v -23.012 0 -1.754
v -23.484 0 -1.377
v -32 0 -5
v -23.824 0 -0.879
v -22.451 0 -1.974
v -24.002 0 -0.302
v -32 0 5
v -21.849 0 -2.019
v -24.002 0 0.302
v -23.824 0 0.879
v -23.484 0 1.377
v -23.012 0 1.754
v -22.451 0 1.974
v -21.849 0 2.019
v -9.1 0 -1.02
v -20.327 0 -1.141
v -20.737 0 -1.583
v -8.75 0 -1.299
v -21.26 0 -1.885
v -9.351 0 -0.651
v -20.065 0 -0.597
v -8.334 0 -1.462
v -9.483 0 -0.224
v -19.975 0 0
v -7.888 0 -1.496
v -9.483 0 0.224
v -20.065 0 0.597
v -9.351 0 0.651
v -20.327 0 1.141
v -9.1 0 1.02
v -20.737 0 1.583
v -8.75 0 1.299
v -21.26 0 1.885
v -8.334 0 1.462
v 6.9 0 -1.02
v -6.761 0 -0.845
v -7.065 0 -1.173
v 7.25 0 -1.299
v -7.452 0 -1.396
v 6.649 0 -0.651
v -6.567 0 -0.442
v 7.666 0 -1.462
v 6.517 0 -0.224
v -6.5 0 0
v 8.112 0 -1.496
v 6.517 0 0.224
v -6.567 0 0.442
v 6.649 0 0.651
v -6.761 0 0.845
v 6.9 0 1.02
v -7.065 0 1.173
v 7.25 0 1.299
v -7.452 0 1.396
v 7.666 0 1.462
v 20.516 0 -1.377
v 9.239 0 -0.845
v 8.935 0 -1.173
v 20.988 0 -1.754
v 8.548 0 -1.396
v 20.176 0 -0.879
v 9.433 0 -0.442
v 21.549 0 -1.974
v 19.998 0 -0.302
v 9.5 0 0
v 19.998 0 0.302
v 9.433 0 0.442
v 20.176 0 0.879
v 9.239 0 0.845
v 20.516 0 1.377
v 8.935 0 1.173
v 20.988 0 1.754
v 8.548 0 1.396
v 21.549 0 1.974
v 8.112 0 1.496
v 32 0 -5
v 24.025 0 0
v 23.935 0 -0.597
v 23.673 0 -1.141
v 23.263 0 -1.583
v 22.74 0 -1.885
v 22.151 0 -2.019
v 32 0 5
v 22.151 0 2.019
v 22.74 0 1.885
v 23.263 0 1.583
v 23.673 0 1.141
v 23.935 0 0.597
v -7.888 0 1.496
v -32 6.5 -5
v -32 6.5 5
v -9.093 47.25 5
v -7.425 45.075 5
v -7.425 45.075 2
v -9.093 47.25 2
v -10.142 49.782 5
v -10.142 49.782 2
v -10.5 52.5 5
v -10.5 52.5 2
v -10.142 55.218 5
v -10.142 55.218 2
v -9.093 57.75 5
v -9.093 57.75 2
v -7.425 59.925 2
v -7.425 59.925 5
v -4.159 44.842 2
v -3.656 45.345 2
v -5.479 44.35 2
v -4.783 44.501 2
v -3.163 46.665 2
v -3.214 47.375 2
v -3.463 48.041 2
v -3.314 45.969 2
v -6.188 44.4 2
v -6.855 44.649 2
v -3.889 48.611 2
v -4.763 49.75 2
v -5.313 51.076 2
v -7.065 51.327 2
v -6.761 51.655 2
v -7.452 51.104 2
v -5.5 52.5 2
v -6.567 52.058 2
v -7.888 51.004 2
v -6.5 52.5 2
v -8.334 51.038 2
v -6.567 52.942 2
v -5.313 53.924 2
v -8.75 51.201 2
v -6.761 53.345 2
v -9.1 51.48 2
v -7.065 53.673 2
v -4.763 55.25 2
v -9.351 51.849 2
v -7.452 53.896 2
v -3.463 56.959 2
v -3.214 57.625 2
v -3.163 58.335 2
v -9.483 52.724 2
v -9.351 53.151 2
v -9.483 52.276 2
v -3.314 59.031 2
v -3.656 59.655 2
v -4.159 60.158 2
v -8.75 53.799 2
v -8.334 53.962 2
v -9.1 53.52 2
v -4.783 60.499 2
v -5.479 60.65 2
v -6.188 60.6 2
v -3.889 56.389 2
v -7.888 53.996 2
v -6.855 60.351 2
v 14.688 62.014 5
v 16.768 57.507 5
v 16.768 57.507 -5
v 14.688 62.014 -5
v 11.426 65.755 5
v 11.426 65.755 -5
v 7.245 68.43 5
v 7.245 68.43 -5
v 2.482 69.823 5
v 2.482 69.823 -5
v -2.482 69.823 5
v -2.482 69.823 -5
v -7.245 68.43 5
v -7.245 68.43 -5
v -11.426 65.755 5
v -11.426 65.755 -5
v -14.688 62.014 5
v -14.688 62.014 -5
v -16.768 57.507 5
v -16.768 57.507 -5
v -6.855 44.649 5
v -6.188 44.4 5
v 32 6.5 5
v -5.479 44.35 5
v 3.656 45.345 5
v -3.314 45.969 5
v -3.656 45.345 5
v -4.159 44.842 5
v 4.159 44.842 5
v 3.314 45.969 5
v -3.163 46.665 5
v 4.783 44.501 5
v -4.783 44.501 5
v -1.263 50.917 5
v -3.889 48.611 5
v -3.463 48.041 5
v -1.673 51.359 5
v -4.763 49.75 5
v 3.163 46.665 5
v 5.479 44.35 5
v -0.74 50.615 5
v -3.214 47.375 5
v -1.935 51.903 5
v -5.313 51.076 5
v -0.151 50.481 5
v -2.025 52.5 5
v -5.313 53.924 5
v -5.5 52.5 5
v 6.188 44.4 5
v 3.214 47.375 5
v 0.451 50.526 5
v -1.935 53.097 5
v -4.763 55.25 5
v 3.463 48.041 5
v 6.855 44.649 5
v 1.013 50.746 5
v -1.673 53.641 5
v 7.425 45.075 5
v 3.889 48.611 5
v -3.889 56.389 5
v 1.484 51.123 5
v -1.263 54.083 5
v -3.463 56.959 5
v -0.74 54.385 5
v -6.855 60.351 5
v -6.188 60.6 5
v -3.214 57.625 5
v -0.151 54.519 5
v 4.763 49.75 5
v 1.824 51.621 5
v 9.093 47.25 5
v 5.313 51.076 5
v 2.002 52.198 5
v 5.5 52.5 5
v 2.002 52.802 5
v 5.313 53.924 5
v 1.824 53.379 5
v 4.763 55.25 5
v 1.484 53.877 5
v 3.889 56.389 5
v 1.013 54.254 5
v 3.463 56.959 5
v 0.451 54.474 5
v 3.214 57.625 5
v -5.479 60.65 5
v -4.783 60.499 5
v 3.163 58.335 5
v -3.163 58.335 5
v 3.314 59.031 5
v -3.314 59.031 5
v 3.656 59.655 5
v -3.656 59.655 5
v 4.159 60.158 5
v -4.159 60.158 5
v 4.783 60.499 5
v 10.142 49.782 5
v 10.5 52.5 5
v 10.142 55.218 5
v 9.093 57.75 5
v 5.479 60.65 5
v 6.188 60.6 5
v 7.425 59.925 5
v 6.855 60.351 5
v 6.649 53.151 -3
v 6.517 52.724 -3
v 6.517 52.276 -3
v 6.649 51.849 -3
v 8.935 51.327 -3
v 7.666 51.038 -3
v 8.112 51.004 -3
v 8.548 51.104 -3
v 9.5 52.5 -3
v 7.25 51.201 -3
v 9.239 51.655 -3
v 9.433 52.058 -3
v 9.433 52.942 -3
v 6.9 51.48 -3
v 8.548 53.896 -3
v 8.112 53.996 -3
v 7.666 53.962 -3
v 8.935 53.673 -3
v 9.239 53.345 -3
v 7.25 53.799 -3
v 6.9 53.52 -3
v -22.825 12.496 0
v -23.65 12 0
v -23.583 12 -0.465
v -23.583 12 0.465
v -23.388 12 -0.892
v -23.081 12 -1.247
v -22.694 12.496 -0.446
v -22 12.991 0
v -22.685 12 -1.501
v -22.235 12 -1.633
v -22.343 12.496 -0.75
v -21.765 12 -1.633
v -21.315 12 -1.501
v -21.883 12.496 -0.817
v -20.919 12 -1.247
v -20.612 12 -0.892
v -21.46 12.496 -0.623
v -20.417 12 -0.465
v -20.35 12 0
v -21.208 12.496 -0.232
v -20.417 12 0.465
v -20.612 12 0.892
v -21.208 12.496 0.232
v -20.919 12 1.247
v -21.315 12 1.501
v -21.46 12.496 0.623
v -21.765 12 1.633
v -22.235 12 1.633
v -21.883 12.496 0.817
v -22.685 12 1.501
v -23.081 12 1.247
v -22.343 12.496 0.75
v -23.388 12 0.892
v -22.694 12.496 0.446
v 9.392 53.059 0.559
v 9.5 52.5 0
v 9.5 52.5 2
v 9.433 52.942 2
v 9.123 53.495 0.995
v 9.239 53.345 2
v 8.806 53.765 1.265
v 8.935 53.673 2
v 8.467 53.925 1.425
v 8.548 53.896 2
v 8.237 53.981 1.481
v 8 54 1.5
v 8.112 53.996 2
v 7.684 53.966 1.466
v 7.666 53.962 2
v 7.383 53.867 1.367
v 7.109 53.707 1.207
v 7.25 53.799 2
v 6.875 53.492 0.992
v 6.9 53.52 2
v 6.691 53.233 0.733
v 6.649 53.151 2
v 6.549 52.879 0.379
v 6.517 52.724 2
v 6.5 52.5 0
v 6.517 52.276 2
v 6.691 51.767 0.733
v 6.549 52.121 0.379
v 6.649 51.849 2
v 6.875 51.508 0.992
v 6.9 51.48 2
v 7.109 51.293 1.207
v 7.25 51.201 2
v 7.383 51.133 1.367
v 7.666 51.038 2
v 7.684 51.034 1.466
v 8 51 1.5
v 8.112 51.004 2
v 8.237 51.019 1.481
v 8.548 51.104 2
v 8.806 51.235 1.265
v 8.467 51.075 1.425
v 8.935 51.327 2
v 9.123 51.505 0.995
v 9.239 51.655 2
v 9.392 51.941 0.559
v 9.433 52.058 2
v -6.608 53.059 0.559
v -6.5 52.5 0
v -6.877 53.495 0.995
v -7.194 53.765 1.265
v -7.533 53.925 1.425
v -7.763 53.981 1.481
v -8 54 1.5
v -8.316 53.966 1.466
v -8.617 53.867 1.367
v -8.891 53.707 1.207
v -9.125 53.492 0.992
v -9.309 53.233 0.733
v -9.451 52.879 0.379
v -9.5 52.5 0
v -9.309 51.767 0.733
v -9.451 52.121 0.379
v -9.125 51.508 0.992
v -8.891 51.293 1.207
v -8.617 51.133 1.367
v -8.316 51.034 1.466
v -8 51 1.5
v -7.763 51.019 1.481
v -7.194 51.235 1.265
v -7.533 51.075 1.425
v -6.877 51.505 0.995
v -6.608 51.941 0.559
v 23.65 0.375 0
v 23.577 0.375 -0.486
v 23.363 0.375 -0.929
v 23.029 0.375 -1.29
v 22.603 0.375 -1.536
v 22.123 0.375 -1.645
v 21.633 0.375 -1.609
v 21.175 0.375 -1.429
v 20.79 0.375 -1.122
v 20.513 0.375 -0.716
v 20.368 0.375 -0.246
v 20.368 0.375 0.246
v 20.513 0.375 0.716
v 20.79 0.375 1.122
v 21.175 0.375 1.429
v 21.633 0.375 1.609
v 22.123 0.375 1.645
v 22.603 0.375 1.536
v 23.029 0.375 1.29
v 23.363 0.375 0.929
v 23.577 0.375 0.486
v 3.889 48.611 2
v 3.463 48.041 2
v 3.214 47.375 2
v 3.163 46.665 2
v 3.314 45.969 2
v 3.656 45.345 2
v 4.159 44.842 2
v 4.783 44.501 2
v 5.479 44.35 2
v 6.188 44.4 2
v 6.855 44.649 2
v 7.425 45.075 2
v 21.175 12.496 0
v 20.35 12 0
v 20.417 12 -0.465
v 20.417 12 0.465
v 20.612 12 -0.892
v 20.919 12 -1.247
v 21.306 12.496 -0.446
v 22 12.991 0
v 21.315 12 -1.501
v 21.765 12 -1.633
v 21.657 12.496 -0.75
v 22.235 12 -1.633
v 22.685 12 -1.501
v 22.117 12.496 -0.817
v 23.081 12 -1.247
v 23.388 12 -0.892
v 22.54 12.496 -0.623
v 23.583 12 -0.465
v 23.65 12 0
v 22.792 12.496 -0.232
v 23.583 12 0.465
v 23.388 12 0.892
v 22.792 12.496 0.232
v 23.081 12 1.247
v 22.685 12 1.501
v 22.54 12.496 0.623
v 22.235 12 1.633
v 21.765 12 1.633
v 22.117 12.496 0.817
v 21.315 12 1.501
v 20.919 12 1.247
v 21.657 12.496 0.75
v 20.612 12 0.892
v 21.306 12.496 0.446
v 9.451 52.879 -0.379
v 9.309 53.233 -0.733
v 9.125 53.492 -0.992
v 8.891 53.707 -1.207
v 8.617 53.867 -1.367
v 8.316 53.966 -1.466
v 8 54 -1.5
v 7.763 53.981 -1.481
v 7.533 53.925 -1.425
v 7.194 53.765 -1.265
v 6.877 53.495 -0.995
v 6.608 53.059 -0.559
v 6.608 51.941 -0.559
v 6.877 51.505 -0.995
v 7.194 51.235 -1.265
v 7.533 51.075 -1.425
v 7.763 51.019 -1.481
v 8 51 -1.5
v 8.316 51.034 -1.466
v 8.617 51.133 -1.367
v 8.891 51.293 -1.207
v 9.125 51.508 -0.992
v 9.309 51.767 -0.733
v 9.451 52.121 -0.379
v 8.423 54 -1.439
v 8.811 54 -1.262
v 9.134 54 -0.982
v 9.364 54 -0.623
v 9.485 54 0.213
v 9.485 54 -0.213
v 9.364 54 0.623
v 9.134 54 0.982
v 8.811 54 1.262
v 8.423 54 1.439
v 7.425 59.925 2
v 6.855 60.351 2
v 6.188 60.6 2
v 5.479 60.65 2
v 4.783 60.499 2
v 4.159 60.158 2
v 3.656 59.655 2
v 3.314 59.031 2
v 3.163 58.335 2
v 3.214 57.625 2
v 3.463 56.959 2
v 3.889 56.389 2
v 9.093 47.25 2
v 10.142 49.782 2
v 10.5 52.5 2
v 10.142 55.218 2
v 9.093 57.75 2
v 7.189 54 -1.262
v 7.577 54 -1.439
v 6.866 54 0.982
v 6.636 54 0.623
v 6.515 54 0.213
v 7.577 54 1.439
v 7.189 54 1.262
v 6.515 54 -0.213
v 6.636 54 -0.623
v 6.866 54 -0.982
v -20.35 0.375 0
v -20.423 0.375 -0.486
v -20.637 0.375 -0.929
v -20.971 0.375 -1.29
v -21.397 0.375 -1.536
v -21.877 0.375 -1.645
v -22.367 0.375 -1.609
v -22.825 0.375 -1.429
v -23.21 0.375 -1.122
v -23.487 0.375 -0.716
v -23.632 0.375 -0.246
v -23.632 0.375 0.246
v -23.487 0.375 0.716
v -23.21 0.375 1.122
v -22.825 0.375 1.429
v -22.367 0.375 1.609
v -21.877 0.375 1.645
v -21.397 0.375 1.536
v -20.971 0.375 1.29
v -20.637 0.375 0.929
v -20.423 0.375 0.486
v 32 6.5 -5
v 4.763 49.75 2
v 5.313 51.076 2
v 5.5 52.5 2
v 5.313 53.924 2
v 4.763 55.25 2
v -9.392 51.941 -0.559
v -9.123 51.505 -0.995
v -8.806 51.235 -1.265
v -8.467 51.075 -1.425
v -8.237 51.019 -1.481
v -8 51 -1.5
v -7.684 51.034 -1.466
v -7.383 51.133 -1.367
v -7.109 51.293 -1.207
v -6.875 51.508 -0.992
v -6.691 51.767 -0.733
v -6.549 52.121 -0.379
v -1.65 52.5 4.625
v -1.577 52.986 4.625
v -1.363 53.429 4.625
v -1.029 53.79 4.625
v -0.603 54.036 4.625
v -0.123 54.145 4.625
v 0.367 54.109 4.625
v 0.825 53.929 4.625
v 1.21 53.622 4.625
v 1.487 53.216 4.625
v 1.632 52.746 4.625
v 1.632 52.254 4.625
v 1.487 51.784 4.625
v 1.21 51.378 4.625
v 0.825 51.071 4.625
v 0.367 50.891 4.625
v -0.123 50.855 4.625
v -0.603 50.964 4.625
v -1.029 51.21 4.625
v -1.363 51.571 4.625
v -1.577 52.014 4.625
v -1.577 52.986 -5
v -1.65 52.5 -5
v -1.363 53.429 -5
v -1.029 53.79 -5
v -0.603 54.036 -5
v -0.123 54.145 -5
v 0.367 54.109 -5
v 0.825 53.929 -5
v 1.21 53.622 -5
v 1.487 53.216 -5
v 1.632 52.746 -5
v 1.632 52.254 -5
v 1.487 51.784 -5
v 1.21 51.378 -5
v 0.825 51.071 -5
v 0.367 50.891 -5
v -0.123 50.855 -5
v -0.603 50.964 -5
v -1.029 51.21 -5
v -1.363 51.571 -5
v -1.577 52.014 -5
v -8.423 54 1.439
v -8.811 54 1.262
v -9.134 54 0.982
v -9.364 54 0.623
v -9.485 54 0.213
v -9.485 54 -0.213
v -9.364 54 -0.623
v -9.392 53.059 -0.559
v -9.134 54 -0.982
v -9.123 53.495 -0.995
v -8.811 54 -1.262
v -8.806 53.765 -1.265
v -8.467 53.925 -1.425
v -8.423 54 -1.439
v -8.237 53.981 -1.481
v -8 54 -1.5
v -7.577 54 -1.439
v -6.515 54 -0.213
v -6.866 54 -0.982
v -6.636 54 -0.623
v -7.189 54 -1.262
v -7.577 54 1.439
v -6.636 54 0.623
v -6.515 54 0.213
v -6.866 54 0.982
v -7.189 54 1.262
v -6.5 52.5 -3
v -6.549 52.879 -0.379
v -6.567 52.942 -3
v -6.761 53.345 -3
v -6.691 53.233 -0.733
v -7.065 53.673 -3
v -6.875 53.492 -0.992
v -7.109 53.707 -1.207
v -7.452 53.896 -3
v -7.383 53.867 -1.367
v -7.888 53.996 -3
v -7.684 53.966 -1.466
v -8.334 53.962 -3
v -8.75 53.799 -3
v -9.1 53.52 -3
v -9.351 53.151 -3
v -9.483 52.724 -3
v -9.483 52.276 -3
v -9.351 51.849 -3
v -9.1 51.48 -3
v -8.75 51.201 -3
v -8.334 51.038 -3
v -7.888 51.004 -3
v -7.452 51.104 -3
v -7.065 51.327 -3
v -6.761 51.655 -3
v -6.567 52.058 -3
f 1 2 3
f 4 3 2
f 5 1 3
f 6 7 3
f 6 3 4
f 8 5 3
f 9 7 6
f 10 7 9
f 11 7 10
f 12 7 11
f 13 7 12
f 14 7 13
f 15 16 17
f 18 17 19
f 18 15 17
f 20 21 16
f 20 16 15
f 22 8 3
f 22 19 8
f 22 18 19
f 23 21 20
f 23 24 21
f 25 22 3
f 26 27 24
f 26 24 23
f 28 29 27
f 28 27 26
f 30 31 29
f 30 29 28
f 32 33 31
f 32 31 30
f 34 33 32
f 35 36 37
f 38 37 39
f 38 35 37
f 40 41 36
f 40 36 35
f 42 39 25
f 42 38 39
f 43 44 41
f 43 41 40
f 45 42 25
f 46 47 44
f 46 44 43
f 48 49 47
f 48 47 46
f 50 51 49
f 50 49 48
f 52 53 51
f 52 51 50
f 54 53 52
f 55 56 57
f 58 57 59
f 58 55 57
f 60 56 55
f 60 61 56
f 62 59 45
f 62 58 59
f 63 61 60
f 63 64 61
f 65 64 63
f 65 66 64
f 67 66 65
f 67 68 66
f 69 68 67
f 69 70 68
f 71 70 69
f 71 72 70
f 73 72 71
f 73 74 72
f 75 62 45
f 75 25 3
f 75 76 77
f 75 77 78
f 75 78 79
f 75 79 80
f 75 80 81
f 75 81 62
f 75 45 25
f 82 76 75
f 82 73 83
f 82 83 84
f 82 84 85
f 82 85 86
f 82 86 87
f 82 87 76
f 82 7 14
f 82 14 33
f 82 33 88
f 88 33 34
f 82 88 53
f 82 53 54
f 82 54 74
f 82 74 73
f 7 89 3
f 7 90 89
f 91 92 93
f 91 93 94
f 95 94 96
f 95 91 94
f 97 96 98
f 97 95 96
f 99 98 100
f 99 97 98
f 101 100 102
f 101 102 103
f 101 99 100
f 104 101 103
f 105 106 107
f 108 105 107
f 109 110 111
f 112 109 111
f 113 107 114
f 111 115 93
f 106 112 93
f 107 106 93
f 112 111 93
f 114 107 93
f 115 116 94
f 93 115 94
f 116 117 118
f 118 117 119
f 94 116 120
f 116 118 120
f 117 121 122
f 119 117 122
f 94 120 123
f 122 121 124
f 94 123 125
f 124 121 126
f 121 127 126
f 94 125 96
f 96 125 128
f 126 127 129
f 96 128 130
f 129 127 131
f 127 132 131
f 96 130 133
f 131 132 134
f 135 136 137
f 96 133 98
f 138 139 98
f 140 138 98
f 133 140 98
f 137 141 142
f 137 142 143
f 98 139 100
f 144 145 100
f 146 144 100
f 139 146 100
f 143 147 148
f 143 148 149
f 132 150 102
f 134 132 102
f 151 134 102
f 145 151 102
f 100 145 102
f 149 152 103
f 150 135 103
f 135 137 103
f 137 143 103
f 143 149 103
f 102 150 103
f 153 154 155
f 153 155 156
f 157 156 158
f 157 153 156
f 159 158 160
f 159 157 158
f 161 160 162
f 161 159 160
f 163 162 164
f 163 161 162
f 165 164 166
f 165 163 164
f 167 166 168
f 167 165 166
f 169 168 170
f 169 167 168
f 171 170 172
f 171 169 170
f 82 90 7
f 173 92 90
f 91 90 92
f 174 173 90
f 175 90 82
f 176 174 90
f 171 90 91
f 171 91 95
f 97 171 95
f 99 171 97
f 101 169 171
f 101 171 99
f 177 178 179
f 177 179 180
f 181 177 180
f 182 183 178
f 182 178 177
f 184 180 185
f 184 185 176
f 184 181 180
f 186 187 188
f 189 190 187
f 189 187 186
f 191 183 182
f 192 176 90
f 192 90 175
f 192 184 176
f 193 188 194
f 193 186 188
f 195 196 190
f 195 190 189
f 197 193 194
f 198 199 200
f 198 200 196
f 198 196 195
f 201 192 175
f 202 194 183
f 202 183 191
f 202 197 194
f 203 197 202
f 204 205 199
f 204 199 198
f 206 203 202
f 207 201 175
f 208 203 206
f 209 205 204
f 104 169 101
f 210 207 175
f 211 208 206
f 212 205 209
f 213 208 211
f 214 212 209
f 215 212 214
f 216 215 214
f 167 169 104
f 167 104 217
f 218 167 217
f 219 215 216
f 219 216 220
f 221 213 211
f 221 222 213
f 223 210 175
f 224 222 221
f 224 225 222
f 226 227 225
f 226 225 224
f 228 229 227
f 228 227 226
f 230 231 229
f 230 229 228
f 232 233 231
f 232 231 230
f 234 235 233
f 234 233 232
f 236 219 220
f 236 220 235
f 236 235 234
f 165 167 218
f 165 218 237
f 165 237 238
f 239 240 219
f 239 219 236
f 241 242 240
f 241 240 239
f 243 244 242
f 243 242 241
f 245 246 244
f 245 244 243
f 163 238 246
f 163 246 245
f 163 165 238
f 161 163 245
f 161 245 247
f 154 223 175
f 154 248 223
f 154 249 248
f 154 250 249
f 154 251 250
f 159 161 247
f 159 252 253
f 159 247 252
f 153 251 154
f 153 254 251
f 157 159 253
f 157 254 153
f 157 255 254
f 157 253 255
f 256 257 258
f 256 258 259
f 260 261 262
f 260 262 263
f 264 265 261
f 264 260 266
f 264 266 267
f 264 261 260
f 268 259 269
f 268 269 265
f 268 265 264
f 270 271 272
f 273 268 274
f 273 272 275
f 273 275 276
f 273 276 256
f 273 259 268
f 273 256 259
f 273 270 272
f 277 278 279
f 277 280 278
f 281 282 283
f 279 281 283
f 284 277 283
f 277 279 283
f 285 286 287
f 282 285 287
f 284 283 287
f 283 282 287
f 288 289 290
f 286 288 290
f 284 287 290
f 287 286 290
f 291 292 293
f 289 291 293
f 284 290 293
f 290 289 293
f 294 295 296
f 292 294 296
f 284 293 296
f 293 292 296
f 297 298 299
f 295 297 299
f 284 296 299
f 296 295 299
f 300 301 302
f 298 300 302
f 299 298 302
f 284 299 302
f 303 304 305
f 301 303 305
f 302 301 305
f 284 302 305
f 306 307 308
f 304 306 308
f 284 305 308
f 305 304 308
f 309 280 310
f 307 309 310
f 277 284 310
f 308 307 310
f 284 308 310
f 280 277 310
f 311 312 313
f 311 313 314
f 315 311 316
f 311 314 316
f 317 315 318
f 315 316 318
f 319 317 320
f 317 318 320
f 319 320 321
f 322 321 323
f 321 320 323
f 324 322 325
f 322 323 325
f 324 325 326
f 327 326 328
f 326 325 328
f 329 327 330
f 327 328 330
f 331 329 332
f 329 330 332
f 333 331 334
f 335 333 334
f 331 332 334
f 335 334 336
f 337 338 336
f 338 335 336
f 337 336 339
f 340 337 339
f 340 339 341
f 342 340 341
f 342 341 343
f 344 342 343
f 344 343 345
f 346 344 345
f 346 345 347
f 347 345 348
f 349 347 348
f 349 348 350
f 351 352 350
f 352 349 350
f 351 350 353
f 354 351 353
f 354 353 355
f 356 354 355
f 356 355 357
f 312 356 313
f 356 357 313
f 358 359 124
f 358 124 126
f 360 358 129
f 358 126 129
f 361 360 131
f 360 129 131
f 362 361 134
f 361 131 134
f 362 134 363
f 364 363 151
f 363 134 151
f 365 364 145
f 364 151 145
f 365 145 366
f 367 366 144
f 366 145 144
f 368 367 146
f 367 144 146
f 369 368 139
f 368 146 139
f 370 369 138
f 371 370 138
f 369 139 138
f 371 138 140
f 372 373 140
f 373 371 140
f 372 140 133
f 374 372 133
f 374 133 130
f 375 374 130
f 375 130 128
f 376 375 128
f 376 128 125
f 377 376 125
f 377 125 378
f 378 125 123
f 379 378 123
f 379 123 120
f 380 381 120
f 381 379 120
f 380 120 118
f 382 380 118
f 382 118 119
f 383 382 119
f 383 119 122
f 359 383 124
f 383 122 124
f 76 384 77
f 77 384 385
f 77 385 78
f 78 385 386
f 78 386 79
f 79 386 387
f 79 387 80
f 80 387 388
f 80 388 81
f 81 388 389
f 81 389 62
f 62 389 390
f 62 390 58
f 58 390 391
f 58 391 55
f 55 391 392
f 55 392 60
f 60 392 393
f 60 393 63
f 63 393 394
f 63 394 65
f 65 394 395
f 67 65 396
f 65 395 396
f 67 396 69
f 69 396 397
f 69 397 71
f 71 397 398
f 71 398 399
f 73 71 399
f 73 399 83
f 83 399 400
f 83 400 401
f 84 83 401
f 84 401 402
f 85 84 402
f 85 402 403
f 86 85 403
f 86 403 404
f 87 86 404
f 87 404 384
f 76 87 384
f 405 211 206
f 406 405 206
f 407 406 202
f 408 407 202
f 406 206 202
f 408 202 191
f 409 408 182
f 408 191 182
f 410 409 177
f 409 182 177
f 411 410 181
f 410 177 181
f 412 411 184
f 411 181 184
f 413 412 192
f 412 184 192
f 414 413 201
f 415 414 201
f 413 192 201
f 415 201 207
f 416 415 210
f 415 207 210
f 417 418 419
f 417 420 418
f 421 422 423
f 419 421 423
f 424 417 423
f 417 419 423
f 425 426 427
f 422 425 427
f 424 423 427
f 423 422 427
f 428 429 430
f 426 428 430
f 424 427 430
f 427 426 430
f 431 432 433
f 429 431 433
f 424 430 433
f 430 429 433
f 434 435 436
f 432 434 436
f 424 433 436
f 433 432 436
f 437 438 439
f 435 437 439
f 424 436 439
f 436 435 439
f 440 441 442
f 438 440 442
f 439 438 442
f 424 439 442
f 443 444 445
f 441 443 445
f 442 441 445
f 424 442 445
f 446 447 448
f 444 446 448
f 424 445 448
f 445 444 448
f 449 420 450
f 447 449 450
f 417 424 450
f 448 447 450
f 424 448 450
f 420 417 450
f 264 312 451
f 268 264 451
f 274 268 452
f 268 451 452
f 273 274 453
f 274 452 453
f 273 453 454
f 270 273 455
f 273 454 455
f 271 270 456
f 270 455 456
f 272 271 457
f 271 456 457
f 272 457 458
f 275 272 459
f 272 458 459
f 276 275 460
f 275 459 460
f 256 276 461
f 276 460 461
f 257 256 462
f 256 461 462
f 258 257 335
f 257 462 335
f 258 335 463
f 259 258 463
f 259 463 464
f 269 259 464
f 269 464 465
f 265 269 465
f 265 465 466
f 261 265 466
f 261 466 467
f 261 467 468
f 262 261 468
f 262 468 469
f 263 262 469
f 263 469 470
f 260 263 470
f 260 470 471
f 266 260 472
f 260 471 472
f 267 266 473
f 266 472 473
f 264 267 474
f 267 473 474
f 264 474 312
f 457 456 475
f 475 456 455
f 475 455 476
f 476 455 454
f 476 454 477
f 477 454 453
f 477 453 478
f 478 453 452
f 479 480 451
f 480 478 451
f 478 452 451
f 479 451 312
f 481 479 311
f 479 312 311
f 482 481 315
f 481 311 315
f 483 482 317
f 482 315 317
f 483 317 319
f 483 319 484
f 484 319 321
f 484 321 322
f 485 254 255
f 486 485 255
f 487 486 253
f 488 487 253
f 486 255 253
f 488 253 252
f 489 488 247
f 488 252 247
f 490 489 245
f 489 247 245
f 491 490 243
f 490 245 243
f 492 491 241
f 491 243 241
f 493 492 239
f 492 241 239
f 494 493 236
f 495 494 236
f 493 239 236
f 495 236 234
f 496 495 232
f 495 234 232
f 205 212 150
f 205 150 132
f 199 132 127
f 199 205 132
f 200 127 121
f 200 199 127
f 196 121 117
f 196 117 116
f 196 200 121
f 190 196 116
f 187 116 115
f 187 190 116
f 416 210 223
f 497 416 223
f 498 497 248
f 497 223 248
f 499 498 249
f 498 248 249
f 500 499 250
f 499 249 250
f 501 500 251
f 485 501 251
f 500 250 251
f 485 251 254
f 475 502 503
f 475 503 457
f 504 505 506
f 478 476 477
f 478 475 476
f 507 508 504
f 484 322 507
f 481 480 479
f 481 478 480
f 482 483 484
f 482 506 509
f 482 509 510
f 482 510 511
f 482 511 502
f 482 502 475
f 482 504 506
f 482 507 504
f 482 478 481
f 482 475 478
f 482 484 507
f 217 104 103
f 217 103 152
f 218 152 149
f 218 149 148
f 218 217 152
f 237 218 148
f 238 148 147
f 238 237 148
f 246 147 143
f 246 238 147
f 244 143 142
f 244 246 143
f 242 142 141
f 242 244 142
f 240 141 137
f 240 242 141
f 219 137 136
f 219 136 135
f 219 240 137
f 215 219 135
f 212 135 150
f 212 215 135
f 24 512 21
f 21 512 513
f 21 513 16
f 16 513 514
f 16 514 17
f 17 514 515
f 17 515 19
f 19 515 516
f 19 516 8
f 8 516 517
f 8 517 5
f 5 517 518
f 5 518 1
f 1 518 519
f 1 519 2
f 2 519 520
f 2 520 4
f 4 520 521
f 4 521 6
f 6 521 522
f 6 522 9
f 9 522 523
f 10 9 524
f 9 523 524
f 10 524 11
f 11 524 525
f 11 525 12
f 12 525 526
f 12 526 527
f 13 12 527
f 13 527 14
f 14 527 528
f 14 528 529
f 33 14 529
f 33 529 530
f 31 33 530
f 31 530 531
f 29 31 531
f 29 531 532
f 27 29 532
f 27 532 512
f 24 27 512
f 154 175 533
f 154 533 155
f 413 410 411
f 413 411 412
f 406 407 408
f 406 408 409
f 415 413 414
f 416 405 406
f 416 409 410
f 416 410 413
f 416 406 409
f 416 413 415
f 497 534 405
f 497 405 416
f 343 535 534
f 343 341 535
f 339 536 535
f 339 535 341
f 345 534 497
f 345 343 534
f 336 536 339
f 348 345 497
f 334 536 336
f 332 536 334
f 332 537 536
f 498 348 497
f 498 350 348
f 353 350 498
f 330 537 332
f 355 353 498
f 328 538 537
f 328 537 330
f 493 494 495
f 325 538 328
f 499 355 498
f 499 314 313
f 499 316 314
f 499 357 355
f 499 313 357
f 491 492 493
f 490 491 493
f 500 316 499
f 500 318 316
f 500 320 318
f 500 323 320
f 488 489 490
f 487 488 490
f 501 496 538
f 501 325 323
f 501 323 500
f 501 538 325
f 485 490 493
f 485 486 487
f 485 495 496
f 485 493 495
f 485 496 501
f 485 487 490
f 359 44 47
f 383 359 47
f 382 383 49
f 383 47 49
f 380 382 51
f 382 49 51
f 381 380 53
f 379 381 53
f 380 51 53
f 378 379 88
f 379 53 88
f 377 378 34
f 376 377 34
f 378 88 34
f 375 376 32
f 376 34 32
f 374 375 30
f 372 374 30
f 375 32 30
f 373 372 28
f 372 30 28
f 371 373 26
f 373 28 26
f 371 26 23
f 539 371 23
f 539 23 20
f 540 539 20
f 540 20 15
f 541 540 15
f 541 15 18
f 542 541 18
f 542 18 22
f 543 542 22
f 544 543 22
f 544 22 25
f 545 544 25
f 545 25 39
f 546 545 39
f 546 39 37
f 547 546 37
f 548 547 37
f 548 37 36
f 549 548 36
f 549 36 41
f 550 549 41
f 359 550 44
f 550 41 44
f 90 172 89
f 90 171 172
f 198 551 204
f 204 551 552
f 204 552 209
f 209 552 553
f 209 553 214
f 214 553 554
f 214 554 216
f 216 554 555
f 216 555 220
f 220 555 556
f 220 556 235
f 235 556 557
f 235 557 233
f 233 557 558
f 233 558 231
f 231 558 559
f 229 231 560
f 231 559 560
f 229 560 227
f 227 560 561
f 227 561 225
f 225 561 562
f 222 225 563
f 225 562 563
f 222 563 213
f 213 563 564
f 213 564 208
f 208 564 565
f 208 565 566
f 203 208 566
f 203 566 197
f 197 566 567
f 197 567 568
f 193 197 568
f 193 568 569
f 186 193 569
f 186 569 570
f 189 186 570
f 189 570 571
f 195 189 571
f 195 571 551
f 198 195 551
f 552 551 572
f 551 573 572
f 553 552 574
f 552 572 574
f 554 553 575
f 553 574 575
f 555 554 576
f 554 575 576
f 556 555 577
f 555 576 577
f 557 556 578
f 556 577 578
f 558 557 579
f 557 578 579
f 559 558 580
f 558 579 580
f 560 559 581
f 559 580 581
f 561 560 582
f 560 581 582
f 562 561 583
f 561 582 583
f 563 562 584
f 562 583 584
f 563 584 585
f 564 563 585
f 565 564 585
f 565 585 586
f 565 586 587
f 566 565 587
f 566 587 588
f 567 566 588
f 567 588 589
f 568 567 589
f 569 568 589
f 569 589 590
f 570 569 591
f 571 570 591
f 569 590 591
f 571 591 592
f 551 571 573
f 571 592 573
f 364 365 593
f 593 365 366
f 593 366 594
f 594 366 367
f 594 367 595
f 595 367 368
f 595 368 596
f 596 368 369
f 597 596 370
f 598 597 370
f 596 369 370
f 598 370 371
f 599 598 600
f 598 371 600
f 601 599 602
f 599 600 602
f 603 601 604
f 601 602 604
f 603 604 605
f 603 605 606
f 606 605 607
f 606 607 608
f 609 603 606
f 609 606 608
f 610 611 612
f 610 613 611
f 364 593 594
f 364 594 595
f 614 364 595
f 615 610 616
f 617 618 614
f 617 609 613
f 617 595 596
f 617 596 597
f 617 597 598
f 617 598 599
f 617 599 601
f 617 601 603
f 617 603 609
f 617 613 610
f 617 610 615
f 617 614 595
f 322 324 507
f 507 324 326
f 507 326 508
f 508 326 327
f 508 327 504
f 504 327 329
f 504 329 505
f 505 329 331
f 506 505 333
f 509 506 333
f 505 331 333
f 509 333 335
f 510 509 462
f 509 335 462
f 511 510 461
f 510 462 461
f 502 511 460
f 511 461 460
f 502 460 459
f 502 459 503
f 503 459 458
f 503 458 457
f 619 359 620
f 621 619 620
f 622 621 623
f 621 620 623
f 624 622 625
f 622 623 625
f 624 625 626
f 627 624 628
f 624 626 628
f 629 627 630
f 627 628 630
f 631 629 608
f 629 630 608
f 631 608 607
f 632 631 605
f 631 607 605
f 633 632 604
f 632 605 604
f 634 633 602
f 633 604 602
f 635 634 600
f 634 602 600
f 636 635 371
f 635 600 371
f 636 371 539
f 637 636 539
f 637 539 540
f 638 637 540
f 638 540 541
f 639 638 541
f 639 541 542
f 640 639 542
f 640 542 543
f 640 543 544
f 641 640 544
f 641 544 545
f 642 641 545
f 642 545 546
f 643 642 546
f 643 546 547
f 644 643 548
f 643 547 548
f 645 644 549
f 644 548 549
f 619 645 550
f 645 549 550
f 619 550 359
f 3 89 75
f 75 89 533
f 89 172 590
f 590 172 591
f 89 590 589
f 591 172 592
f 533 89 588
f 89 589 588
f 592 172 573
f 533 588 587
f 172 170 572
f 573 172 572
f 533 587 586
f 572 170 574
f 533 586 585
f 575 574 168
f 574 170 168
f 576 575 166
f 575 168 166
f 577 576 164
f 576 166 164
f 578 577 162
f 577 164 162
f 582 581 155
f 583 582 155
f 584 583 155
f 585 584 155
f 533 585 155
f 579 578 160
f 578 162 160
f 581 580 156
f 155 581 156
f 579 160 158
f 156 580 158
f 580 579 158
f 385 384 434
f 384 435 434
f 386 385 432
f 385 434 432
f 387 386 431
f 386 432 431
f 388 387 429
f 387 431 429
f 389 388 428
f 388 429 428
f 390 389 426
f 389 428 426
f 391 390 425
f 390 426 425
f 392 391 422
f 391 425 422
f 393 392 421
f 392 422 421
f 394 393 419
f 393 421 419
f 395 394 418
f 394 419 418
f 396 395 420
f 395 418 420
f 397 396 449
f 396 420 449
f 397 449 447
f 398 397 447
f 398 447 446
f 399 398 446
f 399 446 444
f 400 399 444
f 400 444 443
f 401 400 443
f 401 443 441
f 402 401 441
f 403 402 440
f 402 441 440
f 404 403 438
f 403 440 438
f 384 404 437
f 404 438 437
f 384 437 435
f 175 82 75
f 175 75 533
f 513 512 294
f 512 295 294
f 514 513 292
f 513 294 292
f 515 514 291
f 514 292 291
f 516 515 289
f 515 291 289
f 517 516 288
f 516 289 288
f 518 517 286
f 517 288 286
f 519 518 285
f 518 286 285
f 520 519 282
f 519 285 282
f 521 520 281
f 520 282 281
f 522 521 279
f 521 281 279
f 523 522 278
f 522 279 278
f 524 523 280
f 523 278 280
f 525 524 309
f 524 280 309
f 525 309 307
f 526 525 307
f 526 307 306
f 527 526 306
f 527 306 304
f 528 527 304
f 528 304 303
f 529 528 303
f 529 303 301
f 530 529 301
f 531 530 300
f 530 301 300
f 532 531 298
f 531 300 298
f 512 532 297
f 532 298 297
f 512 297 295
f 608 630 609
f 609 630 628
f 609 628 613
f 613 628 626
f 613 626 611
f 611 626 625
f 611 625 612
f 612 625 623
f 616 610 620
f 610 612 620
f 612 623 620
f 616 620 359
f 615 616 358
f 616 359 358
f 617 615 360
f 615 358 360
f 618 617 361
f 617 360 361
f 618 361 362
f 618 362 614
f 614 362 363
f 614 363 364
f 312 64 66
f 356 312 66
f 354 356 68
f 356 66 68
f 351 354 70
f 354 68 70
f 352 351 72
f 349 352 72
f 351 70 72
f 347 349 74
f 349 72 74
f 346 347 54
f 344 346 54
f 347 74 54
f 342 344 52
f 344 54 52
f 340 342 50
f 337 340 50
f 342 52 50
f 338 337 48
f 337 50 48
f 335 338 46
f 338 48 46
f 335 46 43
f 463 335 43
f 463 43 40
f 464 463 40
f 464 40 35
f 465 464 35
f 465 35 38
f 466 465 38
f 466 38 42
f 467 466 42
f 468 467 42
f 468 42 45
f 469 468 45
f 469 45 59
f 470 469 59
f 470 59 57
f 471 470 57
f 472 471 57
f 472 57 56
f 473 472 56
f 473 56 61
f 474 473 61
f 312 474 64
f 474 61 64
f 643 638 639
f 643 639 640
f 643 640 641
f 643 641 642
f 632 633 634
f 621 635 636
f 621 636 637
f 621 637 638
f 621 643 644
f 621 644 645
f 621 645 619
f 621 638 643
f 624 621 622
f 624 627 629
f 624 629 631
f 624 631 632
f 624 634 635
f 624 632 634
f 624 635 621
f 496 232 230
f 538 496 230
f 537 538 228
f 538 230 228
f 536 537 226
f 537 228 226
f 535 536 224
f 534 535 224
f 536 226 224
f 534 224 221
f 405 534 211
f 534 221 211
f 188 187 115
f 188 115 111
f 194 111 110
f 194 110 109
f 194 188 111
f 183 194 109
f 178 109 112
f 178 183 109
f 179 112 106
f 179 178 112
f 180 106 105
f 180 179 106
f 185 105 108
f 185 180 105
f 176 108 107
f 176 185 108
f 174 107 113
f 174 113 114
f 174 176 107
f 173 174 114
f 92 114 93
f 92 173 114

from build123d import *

# Parameters (mm, degrees)
Y_KSEKLIK_EKSTR_ZYON1_DEPTH = 5
M4_DI_LI_DELIK1_D           = 3.3
M4_DI_LI_DELIK1_CSINK_D     = 4.05
M4_DI_LI_DELIK1_CSINK_ANGLE = 90
M4_DI_LI_DELIK2_D           = 3.3
M4_DI_LI_DELIK2_DEPTH       = 12
M4_DI_LI_DELIK2_CSINK_D     = 4.05
M4_DI_LI_DELIK2_CSINK_ANGLE = 90
M4_DI_LI_DELIK2_TIP         = 0.991420021
IZIM12_R                    = 1.5
KES_EKSTR_ZYON1_DEPTH       = 54
KES_EKSTR_ZYON2_DEPTH       = 3
IZIM14_R                    = 1.5
KES_EKSTR_ZYON3_DEPTH       = 5


with BuildPart() as part:
    # Çizim2 → Yükseklik-Ekstrüzyon1 (new, symmetric)
    with BuildSketch(Plane.XY):
        with BuildLine():
            Line((-32, 0), (32, 0))
            Line((32, 0), (32, 6.5))
            Line((32, 6.5), (16.768327291, 57.507314637))
            ThreePointArc((16.768327291, 57.507314637), (0, 70), (-16.768327291, 57.507314637))
            Line((-16.768327291, 57.507314637), (-32, 6.5))
            Line((-32, 6.5), (-32, 0))
        make_face()
    extrude(amount=Y_KSEKLIK_EKSTR_ZYON1_DEPTH, both=True)

    # M4 Dişli Delik1 (through all)
    with Locations(Plane.XY.offset(5)):
        with Locations((0, 52.5)):
            CounterSinkHole(M4_DI_LI_DELIK1_D / 2, M4_DI_LI_DELIK1_CSINK_D / 2, counter_sink_angle=M4_DI_LI_DELIK1_CSINK_ANGLE)

    # M4 Dişli Delik2
    with Locations(Plane(origin=(0, 0, 0), x_dir=(-1, 0, 0), z_dir=(0, -1, 0))):
        with Locations((22, 0), (-22, 0)):
            CounterSinkHole(M4_DI_LI_DELIK2_D / 2, M4_DI_LI_DELIK2_CSINK_D / 2, depth=M4_DI_LI_DELIK2_DEPTH, counter_sink_angle=M4_DI_LI_DELIK2_CSINK_ANGLE)
            with Locations((0, 0, -(M4_DI_LI_DELIK2_DEPTH + M4_DI_LI_DELIK2_TIP / 2))):  # 118° drill point
                Cone(0, M4_DI_LI_DELIK2_D / 2, M4_DI_LI_DELIK2_TIP, mode=Mode.SUBTRACT)

    # Çizim12 → Kes-Ekstrüzyon1 (cut)
    with BuildSketch(Plane.XZ):
        with Locations((-8, 0)):
            Circle(IZIM12_R)
        with Locations((8, 0)):
            Circle(IZIM12_R)
    extrude(amount=-KES_EKSTR_ZYON1_DEPTH, mode=Mode.SUBTRACT)

    # Çizim13 → Kes-Ekstrüzyon2 (cut)
    with BuildSketch(Plane(origin=(0, 0, 5), x_dir=(-1, 0, 0), z_dir=(0, 0, -1))):
        with BuildLine():
            ThreePointArc((7.424621202, 45.075378798), (10.5, 52.5), (7.424621202, 59.924621202))
            ThreePointArc((7.424621202, 59.924621202), (3.889087297, 59.924621202), (3.889087297, 56.389087297))
            ThreePointArc((3.889087297, 56.389087297), (5.5, 52.5), (3.889087297, 48.610912703))
            ThreePointArc((3.889087297, 48.610912703), (3.889087297, 45.075378798), (7.424621202, 45.075378798))
        make_face()
        with BuildLine():
            ThreePointArc((-7.424621202, 45.075378798), (-10.5, 52.5), (-7.424621202, 59.924621202))
            ThreePointArc((-7.424621202, 59.924621202), (-3.889087297, 59.924621202), (-3.889087297, 56.389087297))
            ThreePointArc((-3.889087297, 56.389087297), (-5.5, 52.5), (-3.889087297, 48.610912703))
            ThreePointArc((-3.889087297, 48.610912703), (-3.889087297, 45.075378798), (-7.424621202, 45.075378798))
        make_face()
    extrude(amount=KES_EKSTR_ZYON2_DEPTH, mode=Mode.SUBTRACT)

    # Çizim14 → Kes-Ekstrüzyon3 (cut)
    with BuildSketch(Plane.XY.offset(2)):
        with Locations((-8, 52.5)):
            Circle(IZIM14_R)
        with Locations((8, 52.5)):
            Circle(IZIM14_R)
    extrude(amount=-KES_EKSTR_ZYON3_DEPTH, mode=Mode.SUBTRACT)


solid = part.part
